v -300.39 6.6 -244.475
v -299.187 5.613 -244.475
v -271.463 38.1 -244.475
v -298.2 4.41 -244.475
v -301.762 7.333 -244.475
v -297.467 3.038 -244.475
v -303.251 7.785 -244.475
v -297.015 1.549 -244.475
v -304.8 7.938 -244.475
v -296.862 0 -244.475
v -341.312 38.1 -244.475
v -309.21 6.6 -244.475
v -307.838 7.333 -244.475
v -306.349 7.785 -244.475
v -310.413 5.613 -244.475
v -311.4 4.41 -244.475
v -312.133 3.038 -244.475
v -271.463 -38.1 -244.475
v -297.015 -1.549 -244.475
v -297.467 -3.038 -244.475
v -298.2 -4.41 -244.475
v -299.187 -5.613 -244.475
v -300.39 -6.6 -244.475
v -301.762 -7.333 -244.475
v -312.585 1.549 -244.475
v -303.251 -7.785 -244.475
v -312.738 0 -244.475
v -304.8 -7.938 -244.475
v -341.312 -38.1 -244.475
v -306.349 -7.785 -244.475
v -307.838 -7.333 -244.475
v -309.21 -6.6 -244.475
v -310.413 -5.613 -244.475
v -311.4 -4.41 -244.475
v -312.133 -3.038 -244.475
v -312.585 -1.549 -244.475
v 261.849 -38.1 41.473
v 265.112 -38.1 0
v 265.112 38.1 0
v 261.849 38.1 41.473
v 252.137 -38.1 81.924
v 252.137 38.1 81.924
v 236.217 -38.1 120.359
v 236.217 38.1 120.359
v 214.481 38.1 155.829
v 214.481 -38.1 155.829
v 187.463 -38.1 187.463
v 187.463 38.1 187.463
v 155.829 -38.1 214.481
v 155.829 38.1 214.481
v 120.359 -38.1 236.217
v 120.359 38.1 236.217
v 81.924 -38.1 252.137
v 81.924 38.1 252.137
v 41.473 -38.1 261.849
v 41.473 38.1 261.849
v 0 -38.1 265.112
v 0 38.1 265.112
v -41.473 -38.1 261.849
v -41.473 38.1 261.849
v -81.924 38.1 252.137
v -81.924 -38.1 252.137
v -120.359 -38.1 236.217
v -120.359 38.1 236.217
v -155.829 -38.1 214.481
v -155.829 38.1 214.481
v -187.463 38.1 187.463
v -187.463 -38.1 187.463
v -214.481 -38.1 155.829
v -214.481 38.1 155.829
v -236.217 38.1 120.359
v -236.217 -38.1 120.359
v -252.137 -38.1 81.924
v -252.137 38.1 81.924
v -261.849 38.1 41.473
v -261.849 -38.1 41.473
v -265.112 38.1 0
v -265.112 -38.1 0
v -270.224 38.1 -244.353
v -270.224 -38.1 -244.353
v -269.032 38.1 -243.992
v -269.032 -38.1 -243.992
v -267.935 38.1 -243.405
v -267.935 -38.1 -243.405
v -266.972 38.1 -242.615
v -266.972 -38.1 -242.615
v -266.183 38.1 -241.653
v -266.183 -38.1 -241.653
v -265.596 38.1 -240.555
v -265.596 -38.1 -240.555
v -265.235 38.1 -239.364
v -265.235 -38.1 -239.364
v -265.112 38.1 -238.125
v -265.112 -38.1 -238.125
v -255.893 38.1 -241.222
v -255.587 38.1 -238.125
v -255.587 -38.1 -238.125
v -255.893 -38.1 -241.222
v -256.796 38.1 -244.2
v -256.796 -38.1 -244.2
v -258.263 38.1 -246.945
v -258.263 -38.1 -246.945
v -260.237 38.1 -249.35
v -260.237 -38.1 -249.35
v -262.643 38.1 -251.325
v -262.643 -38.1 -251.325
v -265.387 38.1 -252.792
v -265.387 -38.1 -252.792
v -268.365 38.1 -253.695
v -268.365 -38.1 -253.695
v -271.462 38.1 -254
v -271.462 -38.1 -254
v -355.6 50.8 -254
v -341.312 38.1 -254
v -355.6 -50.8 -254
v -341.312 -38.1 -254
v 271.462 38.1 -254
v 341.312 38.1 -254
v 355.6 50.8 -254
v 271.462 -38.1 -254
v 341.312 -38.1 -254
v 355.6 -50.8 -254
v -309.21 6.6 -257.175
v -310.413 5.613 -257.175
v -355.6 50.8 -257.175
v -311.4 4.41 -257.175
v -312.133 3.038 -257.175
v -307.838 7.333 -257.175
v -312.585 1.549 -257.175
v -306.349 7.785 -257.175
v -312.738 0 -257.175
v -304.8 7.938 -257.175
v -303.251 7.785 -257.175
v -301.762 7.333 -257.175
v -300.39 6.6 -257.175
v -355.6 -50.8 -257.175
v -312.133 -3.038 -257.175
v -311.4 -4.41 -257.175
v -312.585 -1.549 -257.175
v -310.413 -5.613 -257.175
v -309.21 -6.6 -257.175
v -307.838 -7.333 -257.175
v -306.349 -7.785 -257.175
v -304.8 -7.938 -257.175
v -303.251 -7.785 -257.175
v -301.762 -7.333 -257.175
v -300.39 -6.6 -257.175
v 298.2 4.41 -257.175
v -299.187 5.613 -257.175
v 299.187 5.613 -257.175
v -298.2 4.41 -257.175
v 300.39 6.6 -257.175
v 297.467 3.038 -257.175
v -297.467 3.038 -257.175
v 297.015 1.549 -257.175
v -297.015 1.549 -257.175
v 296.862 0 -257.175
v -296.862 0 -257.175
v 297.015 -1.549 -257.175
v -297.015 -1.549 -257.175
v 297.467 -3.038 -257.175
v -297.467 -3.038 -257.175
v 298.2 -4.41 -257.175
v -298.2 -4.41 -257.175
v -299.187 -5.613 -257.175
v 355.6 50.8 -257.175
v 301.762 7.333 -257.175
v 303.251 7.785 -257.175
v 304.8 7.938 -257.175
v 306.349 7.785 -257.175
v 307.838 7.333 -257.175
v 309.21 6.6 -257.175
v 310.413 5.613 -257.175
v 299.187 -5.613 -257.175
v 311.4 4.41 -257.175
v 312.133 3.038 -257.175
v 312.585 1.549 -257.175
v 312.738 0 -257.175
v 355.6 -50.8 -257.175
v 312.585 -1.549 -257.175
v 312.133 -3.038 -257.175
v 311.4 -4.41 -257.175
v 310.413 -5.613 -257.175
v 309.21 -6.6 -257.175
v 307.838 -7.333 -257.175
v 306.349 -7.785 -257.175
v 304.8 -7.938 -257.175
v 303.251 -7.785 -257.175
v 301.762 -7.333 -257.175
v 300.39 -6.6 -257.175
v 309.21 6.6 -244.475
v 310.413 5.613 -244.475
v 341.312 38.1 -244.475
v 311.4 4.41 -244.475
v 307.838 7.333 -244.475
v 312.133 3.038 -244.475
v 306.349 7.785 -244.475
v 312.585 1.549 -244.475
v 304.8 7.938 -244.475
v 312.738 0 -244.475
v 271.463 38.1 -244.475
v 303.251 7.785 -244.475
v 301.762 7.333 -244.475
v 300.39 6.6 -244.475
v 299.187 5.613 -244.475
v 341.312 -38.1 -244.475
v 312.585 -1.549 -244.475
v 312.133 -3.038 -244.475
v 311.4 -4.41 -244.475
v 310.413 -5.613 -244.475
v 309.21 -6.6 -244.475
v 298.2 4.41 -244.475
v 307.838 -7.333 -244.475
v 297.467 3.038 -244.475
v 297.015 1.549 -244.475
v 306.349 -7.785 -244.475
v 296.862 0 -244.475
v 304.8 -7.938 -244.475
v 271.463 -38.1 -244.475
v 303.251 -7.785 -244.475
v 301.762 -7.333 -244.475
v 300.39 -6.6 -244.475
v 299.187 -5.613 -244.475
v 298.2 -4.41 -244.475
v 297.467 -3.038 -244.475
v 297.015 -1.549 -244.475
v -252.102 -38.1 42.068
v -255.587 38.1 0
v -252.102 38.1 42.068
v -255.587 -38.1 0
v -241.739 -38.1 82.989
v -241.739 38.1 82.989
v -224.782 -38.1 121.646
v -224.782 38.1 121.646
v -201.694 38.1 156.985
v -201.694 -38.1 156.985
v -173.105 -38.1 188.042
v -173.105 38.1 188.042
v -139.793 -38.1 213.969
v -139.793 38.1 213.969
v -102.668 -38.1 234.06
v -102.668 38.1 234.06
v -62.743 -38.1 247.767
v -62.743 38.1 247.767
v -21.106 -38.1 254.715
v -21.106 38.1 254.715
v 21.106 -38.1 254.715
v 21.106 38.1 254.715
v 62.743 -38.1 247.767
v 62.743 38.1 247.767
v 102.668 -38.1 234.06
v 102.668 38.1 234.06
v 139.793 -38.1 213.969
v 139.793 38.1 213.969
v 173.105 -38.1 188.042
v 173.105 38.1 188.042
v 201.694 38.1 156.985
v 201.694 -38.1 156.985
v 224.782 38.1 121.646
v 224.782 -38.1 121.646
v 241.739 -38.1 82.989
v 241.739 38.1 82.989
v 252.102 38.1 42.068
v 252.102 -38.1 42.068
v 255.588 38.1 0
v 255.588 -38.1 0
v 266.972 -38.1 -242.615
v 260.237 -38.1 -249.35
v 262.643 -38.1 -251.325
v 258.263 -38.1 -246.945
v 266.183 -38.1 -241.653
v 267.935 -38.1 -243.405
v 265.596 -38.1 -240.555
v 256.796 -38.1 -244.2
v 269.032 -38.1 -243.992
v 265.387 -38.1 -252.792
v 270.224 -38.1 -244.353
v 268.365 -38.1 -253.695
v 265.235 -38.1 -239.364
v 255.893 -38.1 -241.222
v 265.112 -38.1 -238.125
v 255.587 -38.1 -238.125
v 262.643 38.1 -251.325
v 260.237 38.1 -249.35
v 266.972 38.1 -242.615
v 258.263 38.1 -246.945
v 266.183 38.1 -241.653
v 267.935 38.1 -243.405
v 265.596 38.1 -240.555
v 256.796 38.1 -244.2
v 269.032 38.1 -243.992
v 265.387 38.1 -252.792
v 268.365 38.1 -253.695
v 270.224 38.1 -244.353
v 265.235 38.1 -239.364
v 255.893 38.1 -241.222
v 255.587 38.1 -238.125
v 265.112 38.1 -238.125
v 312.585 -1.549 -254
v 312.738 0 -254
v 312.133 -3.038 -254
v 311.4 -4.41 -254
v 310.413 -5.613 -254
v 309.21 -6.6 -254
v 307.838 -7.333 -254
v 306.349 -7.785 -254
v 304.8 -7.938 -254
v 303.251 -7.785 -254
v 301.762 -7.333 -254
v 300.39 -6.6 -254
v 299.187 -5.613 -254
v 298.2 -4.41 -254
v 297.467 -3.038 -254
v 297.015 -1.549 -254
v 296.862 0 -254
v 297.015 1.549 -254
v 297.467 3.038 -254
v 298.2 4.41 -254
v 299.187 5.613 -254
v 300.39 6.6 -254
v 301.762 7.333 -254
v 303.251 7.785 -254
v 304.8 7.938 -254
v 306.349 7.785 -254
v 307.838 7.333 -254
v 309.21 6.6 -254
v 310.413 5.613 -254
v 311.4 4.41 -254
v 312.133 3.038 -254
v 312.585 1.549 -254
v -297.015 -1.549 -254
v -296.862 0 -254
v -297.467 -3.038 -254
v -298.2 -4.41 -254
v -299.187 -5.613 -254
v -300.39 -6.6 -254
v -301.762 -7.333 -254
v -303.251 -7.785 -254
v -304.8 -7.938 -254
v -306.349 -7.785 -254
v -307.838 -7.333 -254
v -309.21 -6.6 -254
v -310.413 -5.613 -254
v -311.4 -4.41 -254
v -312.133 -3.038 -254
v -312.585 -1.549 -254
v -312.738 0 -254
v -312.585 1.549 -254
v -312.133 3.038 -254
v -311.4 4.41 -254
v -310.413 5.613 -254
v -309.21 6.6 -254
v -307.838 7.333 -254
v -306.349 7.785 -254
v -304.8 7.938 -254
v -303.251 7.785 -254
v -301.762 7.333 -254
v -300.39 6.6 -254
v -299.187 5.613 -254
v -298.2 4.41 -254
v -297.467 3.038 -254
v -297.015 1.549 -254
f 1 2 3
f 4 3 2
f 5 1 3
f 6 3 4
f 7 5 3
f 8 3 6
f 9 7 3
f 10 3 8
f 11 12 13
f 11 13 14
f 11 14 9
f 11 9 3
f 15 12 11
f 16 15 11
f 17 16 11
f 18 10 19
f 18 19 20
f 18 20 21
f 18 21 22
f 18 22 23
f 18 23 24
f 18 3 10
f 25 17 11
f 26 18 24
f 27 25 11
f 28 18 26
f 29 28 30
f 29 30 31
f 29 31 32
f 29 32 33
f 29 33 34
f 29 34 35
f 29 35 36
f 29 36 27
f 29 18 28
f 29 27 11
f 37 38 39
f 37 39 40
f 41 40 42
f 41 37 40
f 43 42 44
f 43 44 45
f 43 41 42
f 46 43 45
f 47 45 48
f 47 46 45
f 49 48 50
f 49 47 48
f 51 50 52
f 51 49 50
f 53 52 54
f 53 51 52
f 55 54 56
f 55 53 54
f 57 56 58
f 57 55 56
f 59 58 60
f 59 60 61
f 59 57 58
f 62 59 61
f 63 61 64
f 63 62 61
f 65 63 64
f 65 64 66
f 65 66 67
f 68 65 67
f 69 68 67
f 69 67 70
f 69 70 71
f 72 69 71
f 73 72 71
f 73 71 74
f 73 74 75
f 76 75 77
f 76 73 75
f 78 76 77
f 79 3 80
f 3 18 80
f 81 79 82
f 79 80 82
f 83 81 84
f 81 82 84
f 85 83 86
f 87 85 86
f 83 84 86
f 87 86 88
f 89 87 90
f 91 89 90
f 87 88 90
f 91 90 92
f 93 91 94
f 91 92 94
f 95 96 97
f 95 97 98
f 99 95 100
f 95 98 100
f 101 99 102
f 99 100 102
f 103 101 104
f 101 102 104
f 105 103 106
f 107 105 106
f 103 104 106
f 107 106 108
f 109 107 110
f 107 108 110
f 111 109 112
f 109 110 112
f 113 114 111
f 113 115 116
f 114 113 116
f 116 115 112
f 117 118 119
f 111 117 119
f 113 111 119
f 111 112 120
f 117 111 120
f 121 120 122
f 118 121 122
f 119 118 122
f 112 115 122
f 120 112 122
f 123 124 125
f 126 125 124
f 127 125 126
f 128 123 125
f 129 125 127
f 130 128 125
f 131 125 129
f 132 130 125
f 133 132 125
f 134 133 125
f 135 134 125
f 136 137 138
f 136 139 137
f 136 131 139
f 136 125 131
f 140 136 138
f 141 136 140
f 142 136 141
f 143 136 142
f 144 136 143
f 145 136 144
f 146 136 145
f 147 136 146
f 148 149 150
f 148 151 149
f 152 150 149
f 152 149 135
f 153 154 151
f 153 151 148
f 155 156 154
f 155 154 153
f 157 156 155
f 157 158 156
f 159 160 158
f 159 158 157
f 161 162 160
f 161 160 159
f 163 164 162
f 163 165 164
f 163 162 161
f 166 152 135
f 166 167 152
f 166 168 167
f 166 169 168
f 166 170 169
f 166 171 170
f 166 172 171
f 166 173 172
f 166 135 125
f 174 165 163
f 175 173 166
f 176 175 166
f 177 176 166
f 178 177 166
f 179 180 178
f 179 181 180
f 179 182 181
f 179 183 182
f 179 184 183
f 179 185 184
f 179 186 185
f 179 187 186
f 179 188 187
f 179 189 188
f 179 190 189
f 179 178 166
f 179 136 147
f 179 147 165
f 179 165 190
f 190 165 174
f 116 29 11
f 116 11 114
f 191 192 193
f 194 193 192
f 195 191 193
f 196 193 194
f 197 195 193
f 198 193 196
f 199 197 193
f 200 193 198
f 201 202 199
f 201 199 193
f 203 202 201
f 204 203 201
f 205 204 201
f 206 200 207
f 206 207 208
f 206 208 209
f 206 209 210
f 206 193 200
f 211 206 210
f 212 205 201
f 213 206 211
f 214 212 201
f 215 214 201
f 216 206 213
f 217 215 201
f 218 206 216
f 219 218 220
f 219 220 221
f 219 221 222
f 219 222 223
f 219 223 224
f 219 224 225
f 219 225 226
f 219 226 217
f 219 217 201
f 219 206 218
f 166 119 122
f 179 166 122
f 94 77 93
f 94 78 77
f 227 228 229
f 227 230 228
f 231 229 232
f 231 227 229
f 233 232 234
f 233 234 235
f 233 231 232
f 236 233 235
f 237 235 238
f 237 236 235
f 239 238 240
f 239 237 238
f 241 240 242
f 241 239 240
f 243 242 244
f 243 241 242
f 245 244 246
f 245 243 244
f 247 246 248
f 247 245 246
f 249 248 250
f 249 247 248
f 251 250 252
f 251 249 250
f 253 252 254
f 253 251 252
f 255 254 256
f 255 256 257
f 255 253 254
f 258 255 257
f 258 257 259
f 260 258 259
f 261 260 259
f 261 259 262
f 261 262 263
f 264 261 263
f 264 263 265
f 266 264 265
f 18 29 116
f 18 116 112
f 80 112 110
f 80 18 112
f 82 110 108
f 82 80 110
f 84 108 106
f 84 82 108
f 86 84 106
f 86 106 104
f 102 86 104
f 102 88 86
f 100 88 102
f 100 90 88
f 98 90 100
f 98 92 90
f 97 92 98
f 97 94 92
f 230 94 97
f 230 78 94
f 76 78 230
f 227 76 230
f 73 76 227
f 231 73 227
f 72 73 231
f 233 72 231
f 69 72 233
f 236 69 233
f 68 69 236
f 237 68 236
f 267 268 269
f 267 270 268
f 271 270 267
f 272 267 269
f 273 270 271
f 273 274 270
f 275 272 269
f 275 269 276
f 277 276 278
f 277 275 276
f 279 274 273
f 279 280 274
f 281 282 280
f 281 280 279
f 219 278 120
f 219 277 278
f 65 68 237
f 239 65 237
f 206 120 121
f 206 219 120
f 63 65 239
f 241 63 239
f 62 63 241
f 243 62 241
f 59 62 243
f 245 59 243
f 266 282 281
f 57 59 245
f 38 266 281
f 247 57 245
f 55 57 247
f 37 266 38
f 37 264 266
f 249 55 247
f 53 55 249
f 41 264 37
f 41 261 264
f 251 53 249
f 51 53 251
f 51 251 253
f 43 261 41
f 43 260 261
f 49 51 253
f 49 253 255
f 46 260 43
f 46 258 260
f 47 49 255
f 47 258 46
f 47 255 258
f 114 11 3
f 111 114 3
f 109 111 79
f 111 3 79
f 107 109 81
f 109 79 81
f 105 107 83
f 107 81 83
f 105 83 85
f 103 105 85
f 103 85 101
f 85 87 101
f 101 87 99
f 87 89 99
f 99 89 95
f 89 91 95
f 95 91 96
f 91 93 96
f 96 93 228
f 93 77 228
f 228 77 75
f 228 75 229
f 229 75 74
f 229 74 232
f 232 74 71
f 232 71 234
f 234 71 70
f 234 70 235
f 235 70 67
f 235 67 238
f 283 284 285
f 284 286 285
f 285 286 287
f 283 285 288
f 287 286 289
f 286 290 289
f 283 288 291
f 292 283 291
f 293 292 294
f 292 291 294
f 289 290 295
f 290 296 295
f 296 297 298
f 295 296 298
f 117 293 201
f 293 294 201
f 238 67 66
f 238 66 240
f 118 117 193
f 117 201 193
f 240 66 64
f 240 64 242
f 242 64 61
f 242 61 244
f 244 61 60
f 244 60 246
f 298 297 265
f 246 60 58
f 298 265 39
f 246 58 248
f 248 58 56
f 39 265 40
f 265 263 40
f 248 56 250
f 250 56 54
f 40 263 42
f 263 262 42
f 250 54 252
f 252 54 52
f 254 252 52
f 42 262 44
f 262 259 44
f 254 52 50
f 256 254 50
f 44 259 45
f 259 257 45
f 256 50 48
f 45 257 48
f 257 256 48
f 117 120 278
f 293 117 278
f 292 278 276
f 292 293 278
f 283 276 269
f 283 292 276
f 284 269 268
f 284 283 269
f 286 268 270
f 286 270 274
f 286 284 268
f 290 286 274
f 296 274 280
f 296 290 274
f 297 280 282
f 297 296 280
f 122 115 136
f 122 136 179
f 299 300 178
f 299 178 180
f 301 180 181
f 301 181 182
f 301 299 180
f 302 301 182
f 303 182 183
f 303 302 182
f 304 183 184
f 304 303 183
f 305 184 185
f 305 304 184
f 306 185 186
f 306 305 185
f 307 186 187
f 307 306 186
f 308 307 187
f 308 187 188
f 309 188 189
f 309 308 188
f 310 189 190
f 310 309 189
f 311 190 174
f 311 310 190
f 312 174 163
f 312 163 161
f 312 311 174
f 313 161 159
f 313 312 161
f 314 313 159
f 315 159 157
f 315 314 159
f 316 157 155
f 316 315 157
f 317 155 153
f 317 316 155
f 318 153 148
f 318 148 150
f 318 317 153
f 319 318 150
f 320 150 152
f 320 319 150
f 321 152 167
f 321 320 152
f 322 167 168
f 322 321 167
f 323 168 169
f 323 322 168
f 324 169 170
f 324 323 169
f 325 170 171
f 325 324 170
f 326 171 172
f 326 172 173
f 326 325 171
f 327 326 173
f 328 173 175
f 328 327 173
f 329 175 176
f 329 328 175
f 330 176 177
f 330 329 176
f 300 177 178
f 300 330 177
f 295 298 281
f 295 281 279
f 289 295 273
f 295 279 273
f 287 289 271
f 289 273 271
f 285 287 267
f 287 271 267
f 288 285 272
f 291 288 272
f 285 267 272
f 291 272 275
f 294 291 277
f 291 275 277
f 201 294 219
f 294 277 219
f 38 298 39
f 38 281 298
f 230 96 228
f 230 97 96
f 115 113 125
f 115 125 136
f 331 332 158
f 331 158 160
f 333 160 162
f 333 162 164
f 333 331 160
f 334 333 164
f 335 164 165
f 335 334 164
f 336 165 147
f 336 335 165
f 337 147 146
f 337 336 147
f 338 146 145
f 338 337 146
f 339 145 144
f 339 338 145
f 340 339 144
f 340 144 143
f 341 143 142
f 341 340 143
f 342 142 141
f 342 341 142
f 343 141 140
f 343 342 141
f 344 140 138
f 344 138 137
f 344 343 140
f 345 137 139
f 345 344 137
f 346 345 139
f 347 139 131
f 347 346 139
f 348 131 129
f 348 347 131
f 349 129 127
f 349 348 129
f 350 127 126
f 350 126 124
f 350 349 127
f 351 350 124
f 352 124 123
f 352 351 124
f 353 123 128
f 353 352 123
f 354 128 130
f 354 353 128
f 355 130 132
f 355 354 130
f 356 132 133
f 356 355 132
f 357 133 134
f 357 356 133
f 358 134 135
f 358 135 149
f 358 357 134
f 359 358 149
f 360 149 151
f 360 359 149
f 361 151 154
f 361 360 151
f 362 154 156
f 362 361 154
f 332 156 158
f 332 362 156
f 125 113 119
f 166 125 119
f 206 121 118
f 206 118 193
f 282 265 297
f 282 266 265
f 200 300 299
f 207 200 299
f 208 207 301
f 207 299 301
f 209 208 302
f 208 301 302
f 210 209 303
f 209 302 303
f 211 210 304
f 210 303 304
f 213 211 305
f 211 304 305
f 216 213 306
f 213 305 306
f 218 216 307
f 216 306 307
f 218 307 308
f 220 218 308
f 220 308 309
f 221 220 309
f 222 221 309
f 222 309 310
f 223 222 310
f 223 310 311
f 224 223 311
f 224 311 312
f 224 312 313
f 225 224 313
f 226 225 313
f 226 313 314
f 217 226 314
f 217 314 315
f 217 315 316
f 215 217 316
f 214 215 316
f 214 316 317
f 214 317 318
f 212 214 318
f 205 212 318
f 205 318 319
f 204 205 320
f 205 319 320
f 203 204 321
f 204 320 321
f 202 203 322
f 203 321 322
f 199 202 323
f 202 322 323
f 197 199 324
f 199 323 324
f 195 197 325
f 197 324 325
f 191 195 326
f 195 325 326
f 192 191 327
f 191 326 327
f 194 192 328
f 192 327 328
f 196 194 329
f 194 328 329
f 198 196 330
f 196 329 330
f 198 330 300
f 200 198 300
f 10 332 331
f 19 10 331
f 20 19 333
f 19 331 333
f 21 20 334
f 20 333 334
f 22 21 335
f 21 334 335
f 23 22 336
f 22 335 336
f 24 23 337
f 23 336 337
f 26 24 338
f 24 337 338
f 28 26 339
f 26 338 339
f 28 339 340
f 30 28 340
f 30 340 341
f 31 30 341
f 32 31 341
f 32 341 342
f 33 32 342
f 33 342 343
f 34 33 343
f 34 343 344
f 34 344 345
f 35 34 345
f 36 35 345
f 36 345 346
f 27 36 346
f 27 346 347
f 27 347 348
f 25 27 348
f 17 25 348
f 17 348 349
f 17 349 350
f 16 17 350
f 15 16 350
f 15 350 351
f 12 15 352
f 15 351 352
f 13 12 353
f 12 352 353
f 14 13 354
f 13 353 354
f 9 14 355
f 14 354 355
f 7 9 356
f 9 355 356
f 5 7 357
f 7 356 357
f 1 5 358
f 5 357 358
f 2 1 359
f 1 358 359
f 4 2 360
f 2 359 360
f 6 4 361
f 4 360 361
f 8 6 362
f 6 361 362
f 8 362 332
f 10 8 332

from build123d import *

# Parameters (mm, degrees)
F1_DEPTH = 38.1
F2_R     = 6.35
F3_R     = 15.875
F4_R     = 7.9375
F5_DEPTH = 25.4
F6_W     = 711.2
F6_H     = 101.6
F6_R     = 7.9375
F7_DEPTH = 3.175


with BuildPart() as f1:
    # F0 (on Front) → F1 (new body, symmetric)
    with BuildSketch(Plane.XZ):
        with BuildLine():
            Line((255.5875, -254), (341.3125, -254))
            Line((341.3125, -254), (341.3125, -244.475))
            Line((341.3125, -244.475), (265.1125, -244.475))
            Line((265.1125, -244.475), (265.1125, 0))
            ThreePointArc((265.1125, 0), (0, 265.1125), (-265.1125, 0))
            Line((-265.1125, 0), (-265.1125, -244.475))
            Line((-265.1125, -244.475), (-341.3125, -244.475))
            Line((-341.3125, -244.475), (-341.3125, -254))
            Line((-341.3125, -254), (-255.5875, -254))
            Line((-255.5875, -254), (-255.5875, 0))
            ThreePointArc((-255.5875, 0), (0, 255.5875), (255.5875, 0))
            Line((255.5875, 0), (255.5875, -254))
        make_face()
    extrude(amount=F1_DEPTH, both=True)

    # F2
    f2_edges = [f1.edges().sort_by_distance(p)[0] for p in [
        (-265.1125, 0, -244.475),
        (265.1125, 0, -244.475),
    ]]
    fillet(f2_edges, radius=F2_R)

    # F3
    f3_edges = [f1.edges().sort_by_distance(p)[0] for p in [
        (-255.5875, 0, -254),
        (255.5875, 0, -254),
    ]]
    fillet(f3_edges, radius=F3_R)

    # F4 (on face) → F5 (cut)
    with BuildSketch(Plane(origin=(0, 0, -254), x_dir=(1, 0, 0), z_dir=(0, 0, -1))):
        with Locations((-304.8, 0)):
            Circle(F4_R)
        with Locations((304.8, 0)):
            Circle(F4_R)
    extrude(amount=-F5_DEPTH, mode=Mode.SUBTRACT)

    # F6 (on face) → F7 (join)
    with BuildSketch(Plane(origin=(0, 0, -254), x_dir=(1, 0, 0), z_dir=(0, 0, -1))):
        Rectangle(F6_W, F6_H)
        with Locations((-304.8, 0)):
            Circle(F6_R, mode=Mode.SUBTRACT)
        with Locations((304.8, 0)):
            Circle(F6_R, mode=Mode.SUBTRACT)
    extrude(amount=F7_DEPTH)


solid = f1.part
